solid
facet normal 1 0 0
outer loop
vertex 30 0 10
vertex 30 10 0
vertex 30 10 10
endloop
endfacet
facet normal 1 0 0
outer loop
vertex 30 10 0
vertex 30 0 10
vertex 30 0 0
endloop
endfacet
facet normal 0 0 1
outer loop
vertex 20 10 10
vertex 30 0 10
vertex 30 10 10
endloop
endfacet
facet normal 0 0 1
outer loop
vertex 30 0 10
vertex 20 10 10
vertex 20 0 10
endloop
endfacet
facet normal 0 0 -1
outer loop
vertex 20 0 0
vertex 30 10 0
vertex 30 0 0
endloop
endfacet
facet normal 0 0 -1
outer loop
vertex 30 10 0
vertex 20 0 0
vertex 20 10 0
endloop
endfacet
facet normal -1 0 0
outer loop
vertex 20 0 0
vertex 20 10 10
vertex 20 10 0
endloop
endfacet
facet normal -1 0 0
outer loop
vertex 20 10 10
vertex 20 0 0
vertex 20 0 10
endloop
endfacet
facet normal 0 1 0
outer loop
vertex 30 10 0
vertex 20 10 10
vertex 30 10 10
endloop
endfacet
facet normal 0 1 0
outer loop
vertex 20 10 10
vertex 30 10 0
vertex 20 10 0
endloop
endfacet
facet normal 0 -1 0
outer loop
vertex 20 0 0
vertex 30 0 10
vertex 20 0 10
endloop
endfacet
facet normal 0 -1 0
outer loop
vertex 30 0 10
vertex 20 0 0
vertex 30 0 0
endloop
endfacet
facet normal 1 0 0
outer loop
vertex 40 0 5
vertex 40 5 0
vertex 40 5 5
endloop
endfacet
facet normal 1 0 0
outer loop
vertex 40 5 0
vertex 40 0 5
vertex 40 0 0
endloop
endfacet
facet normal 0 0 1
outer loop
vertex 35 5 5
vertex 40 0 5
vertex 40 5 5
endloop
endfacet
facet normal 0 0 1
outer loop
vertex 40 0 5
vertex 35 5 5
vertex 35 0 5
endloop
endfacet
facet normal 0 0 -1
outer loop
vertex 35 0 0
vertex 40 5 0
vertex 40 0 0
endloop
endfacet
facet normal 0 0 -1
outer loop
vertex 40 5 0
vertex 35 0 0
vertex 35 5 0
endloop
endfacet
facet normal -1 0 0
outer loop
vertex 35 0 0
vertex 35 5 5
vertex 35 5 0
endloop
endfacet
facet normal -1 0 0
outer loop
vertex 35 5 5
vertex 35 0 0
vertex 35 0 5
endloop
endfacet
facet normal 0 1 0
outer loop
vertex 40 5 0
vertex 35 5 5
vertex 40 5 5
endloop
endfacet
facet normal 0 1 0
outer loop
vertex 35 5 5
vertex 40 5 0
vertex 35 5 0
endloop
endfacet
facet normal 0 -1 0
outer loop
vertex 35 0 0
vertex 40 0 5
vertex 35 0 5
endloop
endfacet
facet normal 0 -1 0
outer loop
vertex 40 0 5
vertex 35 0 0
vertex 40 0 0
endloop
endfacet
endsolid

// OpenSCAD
// Original CanvasNet test fixture: the root modifier. Only the marked subtree is drawn: the second cube and the
// small cube next to it, which is marked for debugging inside the root.
cube(10);
!union() {
  translate([20, 0, 0]) cube(10);
  #translate([35, 0, 0]) cube(5);
}
translate([50, 0, 0]) cube(10);
